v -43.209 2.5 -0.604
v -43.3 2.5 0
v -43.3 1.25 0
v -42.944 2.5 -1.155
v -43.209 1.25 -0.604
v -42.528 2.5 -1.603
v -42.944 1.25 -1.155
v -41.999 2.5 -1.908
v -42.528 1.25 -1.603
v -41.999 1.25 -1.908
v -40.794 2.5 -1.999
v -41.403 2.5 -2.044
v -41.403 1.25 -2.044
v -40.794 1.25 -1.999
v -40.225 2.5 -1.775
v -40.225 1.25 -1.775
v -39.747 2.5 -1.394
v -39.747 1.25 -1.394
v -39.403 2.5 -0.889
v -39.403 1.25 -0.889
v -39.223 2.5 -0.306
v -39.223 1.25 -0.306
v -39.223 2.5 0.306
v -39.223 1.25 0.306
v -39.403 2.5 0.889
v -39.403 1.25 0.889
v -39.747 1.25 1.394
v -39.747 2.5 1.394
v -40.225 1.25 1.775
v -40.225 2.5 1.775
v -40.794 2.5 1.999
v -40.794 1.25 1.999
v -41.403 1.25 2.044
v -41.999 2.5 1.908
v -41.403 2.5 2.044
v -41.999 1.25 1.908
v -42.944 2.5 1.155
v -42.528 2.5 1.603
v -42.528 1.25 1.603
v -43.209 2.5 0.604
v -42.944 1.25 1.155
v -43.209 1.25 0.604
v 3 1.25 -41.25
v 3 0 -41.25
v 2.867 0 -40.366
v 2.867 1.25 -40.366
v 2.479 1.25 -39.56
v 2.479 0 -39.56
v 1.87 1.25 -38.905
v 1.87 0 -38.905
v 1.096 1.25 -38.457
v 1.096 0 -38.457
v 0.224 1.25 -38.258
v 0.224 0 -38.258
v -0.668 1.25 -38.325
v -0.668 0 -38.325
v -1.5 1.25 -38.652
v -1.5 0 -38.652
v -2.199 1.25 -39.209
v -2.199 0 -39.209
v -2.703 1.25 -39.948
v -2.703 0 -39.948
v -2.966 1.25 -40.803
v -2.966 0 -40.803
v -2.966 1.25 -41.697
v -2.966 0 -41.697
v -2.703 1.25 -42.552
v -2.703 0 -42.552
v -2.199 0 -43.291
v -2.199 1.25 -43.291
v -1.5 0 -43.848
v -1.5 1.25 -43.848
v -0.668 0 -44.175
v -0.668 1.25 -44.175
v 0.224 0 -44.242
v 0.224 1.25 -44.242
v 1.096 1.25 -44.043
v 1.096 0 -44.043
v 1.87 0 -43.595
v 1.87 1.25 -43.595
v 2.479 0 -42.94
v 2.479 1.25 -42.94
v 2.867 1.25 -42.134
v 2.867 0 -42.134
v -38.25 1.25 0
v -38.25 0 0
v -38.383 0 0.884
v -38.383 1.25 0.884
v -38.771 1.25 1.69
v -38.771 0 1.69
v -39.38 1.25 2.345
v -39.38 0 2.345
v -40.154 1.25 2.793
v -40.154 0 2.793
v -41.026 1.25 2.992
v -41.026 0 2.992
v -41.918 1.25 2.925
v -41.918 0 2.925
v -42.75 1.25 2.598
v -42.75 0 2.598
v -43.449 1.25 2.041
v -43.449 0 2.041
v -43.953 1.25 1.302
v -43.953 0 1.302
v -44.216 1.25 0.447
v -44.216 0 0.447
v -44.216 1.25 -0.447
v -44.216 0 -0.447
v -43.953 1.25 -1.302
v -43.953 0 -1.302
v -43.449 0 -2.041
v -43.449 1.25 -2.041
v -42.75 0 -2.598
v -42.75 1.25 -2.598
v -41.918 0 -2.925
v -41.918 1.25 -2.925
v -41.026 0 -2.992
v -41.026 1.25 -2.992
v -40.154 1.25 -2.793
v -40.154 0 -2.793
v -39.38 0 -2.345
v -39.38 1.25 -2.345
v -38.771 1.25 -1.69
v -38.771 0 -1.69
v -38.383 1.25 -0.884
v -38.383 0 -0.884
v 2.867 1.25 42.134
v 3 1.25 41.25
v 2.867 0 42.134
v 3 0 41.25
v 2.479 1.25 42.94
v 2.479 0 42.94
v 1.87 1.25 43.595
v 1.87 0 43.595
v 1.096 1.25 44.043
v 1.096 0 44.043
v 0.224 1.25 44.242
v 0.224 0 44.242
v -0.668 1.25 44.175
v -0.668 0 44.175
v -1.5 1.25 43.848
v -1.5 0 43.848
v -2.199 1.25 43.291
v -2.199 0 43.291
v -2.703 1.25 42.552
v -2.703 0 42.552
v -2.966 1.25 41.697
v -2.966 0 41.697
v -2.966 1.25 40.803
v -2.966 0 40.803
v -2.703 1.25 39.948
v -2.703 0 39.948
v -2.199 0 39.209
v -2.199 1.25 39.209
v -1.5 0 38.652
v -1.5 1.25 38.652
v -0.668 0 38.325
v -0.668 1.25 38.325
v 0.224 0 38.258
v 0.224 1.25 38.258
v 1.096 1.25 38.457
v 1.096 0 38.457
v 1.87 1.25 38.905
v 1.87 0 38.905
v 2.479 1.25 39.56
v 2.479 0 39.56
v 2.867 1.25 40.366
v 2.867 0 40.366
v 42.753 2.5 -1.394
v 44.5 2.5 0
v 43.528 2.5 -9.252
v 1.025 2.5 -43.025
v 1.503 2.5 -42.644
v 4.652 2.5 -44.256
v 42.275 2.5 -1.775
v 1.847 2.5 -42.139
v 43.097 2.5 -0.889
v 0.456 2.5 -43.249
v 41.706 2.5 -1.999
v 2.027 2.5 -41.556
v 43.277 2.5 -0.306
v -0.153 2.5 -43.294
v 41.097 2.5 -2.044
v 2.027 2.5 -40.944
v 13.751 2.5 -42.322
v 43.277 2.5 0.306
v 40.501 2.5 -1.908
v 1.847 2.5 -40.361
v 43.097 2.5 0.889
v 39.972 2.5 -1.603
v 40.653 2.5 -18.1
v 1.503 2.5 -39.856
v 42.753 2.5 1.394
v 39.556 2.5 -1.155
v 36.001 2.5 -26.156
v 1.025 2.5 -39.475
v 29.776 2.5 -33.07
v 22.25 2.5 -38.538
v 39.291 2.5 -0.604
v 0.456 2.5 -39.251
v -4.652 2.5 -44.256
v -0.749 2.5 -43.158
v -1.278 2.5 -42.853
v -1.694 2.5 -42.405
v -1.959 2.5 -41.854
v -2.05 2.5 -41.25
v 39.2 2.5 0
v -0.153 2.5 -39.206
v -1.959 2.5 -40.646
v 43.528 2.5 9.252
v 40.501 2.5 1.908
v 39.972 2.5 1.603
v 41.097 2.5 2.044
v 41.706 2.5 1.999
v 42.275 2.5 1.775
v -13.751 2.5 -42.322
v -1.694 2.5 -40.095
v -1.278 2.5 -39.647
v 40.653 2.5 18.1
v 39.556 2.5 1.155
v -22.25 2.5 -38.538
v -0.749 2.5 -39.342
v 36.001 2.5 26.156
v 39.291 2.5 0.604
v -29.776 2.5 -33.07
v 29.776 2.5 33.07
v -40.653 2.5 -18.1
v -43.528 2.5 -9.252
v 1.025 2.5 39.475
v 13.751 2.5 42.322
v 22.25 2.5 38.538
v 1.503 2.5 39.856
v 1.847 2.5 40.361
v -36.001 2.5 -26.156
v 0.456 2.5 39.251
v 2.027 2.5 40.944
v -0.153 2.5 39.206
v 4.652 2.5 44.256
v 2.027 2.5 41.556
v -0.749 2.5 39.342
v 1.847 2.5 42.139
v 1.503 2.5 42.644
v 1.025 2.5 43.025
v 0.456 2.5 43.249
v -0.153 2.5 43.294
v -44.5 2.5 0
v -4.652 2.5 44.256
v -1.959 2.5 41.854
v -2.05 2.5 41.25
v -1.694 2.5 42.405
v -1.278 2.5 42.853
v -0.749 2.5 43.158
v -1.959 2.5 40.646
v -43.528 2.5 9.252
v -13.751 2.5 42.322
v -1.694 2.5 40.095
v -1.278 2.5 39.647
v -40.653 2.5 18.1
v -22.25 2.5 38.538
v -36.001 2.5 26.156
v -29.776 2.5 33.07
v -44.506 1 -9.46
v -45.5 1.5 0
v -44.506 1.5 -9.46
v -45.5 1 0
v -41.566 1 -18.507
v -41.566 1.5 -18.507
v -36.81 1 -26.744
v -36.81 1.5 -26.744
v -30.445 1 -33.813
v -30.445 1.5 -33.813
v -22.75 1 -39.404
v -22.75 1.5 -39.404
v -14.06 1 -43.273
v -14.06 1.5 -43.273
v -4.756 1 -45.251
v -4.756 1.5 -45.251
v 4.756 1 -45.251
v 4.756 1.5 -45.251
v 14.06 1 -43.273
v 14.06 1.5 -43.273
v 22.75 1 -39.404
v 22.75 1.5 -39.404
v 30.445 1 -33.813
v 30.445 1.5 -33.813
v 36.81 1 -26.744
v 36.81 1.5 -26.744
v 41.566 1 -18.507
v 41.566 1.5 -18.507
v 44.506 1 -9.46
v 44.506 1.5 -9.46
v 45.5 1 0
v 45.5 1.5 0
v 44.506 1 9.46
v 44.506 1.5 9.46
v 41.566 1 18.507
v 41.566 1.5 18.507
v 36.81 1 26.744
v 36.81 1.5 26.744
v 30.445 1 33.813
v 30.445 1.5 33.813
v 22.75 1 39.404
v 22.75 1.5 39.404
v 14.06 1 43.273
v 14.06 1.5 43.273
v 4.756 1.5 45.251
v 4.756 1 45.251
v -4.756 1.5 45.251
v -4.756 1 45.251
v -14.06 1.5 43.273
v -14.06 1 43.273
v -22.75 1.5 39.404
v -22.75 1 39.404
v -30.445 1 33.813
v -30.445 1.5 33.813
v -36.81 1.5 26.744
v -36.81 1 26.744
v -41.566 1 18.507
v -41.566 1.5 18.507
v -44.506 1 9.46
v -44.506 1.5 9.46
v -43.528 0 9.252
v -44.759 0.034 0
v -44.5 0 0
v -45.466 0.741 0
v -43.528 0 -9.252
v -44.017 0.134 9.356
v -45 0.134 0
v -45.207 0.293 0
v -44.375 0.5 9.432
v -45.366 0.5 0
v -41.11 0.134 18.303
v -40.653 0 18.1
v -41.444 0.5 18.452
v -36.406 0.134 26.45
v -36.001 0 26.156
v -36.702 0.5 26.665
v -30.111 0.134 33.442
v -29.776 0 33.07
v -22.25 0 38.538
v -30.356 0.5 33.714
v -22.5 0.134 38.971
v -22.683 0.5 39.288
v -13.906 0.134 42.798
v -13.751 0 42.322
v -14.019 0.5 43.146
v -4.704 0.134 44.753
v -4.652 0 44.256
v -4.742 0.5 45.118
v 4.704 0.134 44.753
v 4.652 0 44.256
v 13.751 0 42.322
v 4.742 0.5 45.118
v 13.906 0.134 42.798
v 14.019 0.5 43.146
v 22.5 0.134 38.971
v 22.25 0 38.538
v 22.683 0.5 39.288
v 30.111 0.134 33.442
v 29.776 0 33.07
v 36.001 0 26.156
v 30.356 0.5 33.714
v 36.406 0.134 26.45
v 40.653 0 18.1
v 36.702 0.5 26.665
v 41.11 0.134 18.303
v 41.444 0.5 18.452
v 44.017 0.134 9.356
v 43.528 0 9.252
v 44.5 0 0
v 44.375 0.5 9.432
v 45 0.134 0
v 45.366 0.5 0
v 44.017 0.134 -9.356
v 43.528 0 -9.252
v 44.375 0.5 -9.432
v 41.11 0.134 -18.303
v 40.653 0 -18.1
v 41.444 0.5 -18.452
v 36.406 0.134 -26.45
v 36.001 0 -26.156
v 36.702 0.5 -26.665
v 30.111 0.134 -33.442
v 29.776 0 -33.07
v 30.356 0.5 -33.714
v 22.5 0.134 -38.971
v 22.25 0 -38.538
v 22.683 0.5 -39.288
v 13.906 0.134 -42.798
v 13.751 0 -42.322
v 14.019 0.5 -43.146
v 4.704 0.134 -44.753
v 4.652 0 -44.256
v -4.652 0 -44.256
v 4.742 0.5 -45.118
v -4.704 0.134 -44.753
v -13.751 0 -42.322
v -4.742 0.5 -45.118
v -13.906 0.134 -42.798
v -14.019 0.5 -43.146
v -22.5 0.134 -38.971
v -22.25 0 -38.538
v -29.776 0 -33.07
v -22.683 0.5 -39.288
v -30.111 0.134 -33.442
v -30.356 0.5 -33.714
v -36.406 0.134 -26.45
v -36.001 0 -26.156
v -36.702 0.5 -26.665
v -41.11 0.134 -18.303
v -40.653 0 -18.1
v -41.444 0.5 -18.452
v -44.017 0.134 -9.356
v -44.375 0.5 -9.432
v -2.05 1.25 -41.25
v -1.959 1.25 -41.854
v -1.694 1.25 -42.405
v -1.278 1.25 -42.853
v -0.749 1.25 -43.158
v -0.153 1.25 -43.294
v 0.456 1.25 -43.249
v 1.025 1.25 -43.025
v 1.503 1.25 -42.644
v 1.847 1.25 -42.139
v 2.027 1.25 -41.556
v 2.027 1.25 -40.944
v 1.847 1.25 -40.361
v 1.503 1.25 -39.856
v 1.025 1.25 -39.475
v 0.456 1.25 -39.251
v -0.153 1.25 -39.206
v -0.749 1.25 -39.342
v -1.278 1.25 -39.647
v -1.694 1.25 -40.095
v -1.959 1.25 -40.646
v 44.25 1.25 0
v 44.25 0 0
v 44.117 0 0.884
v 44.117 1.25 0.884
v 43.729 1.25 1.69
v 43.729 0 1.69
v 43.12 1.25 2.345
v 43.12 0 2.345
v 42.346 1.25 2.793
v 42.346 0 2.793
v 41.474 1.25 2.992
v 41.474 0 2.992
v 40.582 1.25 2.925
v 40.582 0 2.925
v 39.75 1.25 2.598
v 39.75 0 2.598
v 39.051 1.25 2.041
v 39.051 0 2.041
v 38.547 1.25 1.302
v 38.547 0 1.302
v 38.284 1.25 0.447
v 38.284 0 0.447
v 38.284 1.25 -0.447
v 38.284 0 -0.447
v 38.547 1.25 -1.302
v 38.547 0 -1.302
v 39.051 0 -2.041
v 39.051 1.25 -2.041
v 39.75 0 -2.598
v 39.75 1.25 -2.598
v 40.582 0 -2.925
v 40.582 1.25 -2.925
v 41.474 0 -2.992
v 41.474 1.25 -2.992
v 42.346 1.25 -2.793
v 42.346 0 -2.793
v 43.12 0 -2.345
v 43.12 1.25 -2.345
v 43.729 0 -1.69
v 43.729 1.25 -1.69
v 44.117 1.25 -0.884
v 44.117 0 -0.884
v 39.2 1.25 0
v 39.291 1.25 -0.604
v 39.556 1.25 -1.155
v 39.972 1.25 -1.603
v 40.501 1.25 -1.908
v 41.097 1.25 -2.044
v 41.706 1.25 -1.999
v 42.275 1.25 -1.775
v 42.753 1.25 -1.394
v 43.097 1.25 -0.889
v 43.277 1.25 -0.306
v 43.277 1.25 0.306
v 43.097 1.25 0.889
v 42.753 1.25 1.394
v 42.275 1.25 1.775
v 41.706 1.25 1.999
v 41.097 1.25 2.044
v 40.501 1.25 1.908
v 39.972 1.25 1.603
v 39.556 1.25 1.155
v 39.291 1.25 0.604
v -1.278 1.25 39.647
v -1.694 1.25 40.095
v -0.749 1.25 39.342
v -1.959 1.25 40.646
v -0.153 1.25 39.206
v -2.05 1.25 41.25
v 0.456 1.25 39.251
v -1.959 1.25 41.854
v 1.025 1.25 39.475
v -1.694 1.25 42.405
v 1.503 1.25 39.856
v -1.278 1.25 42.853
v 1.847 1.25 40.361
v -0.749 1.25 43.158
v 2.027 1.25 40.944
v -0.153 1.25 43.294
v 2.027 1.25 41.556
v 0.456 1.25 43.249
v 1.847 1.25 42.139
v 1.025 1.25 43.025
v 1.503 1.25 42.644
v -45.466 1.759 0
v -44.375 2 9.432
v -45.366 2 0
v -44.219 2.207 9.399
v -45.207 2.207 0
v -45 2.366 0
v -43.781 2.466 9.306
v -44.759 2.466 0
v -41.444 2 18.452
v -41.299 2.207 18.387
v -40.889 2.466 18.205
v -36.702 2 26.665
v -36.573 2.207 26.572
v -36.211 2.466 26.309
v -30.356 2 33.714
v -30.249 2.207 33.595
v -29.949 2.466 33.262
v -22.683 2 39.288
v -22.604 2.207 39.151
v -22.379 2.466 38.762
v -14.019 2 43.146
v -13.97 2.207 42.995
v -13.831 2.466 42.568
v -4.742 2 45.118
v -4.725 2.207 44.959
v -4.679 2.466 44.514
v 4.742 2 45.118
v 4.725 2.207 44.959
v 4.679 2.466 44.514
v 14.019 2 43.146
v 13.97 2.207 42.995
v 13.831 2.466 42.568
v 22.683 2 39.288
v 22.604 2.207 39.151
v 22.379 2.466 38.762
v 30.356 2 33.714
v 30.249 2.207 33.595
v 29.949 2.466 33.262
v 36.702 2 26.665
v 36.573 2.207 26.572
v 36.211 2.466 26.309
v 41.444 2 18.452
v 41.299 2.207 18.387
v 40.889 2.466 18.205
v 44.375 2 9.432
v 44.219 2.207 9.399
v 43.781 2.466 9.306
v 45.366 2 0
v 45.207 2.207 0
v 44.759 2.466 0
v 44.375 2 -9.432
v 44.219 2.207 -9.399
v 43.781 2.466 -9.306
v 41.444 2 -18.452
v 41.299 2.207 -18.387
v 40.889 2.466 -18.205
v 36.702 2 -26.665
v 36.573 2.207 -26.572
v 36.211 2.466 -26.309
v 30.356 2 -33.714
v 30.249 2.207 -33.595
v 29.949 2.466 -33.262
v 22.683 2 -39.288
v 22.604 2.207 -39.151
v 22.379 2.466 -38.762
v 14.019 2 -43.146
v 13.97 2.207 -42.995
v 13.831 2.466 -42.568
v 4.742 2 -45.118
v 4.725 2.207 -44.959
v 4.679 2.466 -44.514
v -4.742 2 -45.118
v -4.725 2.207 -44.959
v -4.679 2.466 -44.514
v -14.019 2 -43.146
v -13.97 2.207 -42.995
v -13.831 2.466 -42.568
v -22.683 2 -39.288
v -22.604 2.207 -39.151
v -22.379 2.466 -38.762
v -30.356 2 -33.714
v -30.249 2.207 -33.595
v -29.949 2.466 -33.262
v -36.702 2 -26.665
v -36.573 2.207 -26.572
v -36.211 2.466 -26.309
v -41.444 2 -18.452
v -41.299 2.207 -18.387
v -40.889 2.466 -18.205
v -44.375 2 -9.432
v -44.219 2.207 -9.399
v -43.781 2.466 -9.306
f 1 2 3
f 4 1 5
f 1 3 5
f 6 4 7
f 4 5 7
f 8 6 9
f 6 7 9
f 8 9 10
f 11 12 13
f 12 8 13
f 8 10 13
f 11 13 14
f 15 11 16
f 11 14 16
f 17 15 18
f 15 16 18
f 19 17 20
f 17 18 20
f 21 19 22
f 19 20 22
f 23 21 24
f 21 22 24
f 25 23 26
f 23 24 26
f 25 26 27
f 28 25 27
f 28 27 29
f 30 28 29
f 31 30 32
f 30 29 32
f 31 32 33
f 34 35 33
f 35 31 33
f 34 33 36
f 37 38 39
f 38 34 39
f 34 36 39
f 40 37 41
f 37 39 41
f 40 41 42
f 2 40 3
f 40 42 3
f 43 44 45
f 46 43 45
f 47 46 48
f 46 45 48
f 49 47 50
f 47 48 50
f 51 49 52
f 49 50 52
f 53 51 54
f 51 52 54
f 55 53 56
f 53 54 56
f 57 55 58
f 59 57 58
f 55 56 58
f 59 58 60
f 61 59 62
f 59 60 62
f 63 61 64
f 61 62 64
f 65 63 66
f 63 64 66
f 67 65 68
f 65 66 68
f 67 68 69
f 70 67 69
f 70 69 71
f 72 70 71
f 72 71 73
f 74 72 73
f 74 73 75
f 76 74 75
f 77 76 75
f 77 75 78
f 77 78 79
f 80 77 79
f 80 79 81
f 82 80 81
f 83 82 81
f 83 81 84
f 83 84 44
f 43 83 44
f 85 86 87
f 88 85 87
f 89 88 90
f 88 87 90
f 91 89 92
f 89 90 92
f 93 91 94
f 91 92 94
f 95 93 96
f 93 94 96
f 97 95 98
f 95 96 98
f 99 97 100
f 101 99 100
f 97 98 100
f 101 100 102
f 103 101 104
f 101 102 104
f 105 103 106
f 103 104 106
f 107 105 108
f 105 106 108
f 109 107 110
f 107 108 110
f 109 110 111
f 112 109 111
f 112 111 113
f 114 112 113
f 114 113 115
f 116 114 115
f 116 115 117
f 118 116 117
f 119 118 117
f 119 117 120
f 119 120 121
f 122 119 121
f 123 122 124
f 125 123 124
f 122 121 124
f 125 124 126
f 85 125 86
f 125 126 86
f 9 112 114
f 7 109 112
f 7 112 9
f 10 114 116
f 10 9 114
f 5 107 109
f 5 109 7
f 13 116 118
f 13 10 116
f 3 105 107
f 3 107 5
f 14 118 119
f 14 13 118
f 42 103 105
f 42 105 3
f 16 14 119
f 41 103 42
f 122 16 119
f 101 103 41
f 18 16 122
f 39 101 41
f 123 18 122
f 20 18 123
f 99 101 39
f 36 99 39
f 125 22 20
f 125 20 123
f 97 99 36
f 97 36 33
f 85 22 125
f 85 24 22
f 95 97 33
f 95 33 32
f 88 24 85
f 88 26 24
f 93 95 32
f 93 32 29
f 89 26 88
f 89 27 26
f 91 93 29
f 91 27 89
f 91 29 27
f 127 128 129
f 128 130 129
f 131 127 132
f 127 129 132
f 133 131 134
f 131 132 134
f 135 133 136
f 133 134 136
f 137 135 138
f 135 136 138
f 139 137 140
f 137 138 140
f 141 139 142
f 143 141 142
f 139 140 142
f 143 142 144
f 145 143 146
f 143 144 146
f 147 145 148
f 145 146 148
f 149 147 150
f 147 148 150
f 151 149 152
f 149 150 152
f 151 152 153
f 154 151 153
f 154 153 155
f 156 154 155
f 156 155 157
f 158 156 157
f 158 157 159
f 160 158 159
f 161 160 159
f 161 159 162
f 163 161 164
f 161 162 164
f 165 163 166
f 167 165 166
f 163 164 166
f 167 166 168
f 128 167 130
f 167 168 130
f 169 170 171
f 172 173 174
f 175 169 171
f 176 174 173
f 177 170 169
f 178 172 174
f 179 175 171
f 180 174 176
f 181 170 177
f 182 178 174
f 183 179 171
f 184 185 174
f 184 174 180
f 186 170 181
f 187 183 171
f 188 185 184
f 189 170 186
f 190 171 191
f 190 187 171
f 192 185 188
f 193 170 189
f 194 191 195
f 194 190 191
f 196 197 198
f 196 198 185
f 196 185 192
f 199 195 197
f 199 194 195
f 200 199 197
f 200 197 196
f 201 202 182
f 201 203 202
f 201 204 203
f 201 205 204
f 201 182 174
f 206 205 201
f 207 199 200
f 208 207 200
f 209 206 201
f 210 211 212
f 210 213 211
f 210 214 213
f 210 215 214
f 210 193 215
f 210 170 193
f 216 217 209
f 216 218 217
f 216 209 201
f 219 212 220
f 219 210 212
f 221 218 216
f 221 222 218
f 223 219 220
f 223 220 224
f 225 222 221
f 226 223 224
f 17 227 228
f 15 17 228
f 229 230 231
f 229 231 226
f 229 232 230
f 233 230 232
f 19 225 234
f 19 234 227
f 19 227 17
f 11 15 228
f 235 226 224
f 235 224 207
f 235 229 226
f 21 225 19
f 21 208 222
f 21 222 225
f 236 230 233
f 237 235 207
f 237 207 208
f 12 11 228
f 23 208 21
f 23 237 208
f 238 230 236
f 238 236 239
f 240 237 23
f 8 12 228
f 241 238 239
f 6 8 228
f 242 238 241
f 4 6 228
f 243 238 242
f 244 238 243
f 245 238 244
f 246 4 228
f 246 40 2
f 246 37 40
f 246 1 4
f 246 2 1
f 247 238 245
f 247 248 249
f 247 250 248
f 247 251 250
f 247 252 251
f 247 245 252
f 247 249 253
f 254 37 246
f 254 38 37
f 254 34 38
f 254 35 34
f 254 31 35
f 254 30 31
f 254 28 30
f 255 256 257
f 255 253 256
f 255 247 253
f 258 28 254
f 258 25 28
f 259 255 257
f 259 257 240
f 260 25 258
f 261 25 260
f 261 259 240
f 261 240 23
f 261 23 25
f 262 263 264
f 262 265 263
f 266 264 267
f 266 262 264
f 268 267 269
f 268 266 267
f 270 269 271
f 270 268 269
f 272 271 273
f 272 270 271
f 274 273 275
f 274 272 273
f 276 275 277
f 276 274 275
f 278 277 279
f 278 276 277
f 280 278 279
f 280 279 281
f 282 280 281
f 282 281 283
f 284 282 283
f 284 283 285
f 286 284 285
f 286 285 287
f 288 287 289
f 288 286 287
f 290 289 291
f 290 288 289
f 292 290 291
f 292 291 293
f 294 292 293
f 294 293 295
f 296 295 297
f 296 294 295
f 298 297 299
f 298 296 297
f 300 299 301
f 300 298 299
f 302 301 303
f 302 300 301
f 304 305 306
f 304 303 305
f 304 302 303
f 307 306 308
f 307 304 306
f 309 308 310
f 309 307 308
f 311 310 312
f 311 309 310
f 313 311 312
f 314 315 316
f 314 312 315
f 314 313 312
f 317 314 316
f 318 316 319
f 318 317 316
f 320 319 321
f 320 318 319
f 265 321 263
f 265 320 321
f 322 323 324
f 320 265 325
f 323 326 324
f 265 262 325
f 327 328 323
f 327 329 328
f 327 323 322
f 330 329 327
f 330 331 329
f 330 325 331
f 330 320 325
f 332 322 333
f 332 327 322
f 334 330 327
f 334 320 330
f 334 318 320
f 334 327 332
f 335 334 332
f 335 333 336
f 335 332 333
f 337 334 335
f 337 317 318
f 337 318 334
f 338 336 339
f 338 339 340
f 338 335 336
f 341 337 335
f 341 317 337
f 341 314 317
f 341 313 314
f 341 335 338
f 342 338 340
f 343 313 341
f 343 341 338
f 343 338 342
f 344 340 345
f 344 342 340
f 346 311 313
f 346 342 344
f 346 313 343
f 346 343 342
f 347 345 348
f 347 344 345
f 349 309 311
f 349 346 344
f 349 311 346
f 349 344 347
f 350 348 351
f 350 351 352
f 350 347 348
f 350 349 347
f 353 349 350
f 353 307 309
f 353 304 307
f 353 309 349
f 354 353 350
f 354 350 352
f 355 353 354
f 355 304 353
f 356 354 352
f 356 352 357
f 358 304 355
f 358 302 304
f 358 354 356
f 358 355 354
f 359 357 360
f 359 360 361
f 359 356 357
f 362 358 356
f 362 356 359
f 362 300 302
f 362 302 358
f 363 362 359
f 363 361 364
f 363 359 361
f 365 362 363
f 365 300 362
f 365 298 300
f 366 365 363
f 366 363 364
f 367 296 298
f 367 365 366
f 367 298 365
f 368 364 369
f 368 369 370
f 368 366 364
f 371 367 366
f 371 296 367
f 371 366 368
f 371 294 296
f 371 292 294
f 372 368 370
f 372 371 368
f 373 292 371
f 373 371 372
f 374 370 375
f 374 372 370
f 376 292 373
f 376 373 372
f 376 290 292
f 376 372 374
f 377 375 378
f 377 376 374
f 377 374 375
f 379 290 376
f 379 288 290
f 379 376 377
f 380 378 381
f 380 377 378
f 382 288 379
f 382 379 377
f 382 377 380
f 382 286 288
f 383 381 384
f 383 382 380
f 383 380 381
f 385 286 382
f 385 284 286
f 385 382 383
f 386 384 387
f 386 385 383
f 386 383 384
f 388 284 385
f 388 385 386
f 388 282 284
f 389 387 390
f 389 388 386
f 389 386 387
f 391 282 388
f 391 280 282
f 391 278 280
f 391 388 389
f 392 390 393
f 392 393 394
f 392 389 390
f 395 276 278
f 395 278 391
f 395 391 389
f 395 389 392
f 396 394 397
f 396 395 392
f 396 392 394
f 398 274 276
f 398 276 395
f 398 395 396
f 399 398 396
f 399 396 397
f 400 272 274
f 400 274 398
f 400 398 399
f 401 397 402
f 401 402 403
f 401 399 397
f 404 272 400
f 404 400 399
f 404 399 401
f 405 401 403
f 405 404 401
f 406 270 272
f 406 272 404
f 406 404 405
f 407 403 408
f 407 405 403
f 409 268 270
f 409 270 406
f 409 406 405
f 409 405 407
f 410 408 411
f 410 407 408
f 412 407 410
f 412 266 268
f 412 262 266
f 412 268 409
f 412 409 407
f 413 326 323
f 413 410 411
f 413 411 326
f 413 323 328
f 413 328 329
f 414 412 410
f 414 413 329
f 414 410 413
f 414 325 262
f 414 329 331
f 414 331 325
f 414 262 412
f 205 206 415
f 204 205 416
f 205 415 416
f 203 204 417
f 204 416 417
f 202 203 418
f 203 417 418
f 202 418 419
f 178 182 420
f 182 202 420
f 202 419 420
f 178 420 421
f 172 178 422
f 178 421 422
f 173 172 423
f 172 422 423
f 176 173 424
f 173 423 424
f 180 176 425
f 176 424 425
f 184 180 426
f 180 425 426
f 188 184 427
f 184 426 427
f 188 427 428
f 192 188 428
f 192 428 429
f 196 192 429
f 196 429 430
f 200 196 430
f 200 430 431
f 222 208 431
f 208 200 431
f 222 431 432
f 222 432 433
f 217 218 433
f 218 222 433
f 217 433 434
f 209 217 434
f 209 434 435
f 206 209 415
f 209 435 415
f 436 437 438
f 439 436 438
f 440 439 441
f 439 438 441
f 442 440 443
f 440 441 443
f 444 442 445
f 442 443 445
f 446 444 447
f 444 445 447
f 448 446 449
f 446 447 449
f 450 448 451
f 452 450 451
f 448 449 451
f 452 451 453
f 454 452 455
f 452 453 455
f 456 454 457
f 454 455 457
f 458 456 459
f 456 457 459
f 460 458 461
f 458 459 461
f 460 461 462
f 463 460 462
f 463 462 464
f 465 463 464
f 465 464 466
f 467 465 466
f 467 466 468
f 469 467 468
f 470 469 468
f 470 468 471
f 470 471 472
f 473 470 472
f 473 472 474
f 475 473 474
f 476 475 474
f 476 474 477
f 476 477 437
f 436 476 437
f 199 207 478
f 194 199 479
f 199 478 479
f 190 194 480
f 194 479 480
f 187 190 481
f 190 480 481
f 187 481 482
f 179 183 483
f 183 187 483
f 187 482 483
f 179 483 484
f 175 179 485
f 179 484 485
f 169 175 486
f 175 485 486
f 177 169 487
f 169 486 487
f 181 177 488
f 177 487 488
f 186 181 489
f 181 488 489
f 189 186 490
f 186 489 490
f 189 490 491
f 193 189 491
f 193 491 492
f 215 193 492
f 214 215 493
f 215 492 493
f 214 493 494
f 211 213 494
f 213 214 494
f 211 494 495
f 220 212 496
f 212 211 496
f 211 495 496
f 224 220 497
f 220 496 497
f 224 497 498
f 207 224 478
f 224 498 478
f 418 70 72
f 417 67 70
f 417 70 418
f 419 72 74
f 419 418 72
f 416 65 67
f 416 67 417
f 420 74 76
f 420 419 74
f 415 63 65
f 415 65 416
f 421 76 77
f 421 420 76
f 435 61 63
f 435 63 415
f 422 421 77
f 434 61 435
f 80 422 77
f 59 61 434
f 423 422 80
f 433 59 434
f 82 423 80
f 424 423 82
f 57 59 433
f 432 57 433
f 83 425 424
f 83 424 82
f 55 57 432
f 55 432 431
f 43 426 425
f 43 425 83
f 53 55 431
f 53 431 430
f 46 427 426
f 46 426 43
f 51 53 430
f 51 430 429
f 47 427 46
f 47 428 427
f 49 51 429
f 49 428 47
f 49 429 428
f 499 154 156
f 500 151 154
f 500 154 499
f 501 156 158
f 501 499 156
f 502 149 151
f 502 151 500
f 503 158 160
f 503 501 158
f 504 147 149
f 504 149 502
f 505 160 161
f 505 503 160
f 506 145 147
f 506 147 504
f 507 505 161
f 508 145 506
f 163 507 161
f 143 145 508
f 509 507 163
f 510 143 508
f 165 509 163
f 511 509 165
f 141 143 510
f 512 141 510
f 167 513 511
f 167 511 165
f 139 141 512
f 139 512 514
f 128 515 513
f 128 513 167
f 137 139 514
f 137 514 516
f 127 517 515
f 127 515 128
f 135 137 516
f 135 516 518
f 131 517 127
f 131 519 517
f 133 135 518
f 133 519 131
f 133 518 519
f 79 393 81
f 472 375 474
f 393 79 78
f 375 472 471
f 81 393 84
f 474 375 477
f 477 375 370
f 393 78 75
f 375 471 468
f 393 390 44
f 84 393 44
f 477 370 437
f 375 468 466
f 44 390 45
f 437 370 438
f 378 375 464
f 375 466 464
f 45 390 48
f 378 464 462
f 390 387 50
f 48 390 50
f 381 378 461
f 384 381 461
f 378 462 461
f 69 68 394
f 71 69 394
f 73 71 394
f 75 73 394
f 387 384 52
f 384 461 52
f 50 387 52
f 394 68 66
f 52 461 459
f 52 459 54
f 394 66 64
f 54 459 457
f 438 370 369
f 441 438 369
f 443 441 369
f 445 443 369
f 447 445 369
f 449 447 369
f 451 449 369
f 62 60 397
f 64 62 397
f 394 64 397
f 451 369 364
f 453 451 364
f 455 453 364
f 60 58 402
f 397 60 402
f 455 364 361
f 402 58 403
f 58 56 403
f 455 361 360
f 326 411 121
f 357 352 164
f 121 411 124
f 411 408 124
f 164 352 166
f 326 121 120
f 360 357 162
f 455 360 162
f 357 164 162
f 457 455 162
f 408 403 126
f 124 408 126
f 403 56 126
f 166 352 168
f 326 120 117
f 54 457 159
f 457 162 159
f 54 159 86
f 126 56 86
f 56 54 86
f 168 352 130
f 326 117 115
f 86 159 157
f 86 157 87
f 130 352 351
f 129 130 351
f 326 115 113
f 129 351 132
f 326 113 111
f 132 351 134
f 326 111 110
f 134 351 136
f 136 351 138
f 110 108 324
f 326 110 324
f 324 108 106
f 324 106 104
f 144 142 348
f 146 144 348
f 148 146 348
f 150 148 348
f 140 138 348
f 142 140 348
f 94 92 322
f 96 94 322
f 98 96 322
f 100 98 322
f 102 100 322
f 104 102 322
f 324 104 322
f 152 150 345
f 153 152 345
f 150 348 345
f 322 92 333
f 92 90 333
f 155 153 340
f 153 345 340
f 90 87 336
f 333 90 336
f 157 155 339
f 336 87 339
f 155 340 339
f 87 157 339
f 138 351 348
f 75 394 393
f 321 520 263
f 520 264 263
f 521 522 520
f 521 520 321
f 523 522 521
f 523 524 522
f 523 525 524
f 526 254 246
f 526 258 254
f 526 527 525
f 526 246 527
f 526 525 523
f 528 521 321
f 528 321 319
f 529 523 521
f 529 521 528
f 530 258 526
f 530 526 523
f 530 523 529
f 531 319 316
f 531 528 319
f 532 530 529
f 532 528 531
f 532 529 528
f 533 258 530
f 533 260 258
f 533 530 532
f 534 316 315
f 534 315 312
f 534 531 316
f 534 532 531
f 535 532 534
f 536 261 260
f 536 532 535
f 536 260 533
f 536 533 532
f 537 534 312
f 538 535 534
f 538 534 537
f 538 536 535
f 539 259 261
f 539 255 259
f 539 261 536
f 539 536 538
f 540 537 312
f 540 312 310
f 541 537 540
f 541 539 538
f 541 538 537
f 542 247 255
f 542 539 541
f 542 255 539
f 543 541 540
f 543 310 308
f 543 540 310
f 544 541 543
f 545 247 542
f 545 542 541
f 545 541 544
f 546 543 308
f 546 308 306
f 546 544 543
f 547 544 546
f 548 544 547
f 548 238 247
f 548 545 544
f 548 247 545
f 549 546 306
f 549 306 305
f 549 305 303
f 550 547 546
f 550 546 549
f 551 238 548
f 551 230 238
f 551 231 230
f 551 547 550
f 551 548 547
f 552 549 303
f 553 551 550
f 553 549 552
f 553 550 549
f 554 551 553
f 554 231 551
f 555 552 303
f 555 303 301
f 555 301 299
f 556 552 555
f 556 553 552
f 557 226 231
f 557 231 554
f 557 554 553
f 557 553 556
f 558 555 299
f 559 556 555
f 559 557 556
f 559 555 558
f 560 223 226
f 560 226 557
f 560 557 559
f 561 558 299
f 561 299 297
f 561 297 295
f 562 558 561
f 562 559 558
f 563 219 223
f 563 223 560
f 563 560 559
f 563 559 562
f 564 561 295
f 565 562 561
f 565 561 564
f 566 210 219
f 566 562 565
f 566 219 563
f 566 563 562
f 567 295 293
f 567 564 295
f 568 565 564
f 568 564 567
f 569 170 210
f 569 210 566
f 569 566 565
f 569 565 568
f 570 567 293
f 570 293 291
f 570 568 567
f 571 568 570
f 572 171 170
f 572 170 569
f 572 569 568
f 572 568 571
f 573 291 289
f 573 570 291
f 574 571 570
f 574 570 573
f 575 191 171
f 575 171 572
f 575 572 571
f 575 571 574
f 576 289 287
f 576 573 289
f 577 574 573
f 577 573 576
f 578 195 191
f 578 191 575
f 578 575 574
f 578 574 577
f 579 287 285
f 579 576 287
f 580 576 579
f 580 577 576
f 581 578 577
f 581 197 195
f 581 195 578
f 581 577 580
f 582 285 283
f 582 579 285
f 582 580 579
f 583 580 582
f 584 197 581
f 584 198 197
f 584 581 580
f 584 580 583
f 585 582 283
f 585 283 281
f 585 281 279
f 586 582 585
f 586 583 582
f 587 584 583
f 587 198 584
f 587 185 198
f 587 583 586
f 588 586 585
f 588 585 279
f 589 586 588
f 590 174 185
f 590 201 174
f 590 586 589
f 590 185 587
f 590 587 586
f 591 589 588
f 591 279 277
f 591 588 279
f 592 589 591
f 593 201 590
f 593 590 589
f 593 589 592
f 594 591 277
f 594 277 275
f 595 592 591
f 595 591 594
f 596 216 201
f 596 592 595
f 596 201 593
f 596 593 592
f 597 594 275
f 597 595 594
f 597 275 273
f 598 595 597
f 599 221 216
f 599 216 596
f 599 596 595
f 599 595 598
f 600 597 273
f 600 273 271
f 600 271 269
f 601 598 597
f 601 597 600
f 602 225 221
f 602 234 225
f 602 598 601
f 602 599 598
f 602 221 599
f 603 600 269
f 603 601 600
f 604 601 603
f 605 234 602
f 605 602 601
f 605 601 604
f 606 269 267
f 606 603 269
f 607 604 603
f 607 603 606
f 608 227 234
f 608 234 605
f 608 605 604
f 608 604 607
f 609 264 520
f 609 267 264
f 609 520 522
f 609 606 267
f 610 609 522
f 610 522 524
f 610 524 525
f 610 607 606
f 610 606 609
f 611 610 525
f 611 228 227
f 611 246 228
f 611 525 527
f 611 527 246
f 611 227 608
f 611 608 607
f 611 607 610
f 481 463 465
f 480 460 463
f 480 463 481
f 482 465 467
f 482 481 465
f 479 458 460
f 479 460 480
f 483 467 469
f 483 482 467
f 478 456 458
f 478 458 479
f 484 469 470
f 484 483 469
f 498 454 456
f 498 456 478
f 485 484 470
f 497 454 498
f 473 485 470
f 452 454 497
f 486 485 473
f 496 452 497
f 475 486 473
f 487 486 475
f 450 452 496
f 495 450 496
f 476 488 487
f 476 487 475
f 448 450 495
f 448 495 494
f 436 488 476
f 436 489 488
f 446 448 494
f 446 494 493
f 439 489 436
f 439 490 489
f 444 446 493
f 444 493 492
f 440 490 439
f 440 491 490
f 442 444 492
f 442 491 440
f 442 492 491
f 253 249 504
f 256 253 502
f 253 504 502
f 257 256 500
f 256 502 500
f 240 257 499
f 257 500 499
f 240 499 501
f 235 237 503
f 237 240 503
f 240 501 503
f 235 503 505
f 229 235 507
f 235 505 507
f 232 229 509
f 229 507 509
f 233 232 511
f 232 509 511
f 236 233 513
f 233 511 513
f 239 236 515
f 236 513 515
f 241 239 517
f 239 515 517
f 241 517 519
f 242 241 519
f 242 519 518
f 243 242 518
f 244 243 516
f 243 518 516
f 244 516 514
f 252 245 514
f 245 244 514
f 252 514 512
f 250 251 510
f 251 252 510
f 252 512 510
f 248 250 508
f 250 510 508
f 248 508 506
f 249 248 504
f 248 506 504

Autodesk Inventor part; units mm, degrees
ref_plane "YZ Plane" through (0, 0, 0) normal (1, 0, 0) x (0, 1, 0)
ref_plane "XZ Plane" through (0, 0, 0) normal (0, 1, 0) x (-1, 0, 0)
ref_plane "XY Plane" through (0, 0, 0) normal (0, 0, 1) x (1, 0, 0)
sketch "Sketch4" plane through (0, 0, 0) normal (0, 1, 0) x (-1, 0, 0)
  circle A0 centre (-1.9122, 1.2943) radius 36.25 projected
  circle A1 centre (0, 0) radius 45.5
  circle A2 centre (41.25, 0) radius 2.05
  circle A3 centre (0, 41.25) radius 2.05
  circle A4 centre (-41.25, 0) radius 2.05
  circle A5 centre (0, -41.25) radius 2.05
  dimension "d18" = 91
  dimension "d20" = 4.1
  dimension "d23" = 360
extrude "Extrusion4" add sketch "Sketch4" along normal blind 2.5 contours A0 | A1
sketch "Sketch5" plane through (0, 0, 0) normal (0, -1, 0) x (1, 0, 0)
  circle A0 centre (-41.25, 0) radius 2.05 projected
  circle A1 centre (0, 41.25) radius 2.05 projected
  circle A2 centre (41.25, 0) radius 2.05 projected
  circle A3 centre (0, -41.25) radius 2.05 projected
  circle A4 centre (-41.25, 0) radius 3
  circle A5 centre (0, 41.25) radius 3
  circle A6 centre (41.25, 0) radius 3
  circle A7 centre (0, -41.25) radius 3
  point P0 (0, 0)
  dimension "d27" = 6
  dimension "d28" = 6
  dimension "d29" = 6
  dimension "d30" = 6
extrude "Extrusion5" cut sketch "Sketch5" against normal blind 1.25 contours A0 | A1 | A2 | A3 | A4 | A5 | A6 | A7
fillet "Fillet2" radius 1 2 edges at (45.5, 0, 0) (45.5, 2.5, 0)
properties part number "Base_Cover" material "Acetal Resin, White"
